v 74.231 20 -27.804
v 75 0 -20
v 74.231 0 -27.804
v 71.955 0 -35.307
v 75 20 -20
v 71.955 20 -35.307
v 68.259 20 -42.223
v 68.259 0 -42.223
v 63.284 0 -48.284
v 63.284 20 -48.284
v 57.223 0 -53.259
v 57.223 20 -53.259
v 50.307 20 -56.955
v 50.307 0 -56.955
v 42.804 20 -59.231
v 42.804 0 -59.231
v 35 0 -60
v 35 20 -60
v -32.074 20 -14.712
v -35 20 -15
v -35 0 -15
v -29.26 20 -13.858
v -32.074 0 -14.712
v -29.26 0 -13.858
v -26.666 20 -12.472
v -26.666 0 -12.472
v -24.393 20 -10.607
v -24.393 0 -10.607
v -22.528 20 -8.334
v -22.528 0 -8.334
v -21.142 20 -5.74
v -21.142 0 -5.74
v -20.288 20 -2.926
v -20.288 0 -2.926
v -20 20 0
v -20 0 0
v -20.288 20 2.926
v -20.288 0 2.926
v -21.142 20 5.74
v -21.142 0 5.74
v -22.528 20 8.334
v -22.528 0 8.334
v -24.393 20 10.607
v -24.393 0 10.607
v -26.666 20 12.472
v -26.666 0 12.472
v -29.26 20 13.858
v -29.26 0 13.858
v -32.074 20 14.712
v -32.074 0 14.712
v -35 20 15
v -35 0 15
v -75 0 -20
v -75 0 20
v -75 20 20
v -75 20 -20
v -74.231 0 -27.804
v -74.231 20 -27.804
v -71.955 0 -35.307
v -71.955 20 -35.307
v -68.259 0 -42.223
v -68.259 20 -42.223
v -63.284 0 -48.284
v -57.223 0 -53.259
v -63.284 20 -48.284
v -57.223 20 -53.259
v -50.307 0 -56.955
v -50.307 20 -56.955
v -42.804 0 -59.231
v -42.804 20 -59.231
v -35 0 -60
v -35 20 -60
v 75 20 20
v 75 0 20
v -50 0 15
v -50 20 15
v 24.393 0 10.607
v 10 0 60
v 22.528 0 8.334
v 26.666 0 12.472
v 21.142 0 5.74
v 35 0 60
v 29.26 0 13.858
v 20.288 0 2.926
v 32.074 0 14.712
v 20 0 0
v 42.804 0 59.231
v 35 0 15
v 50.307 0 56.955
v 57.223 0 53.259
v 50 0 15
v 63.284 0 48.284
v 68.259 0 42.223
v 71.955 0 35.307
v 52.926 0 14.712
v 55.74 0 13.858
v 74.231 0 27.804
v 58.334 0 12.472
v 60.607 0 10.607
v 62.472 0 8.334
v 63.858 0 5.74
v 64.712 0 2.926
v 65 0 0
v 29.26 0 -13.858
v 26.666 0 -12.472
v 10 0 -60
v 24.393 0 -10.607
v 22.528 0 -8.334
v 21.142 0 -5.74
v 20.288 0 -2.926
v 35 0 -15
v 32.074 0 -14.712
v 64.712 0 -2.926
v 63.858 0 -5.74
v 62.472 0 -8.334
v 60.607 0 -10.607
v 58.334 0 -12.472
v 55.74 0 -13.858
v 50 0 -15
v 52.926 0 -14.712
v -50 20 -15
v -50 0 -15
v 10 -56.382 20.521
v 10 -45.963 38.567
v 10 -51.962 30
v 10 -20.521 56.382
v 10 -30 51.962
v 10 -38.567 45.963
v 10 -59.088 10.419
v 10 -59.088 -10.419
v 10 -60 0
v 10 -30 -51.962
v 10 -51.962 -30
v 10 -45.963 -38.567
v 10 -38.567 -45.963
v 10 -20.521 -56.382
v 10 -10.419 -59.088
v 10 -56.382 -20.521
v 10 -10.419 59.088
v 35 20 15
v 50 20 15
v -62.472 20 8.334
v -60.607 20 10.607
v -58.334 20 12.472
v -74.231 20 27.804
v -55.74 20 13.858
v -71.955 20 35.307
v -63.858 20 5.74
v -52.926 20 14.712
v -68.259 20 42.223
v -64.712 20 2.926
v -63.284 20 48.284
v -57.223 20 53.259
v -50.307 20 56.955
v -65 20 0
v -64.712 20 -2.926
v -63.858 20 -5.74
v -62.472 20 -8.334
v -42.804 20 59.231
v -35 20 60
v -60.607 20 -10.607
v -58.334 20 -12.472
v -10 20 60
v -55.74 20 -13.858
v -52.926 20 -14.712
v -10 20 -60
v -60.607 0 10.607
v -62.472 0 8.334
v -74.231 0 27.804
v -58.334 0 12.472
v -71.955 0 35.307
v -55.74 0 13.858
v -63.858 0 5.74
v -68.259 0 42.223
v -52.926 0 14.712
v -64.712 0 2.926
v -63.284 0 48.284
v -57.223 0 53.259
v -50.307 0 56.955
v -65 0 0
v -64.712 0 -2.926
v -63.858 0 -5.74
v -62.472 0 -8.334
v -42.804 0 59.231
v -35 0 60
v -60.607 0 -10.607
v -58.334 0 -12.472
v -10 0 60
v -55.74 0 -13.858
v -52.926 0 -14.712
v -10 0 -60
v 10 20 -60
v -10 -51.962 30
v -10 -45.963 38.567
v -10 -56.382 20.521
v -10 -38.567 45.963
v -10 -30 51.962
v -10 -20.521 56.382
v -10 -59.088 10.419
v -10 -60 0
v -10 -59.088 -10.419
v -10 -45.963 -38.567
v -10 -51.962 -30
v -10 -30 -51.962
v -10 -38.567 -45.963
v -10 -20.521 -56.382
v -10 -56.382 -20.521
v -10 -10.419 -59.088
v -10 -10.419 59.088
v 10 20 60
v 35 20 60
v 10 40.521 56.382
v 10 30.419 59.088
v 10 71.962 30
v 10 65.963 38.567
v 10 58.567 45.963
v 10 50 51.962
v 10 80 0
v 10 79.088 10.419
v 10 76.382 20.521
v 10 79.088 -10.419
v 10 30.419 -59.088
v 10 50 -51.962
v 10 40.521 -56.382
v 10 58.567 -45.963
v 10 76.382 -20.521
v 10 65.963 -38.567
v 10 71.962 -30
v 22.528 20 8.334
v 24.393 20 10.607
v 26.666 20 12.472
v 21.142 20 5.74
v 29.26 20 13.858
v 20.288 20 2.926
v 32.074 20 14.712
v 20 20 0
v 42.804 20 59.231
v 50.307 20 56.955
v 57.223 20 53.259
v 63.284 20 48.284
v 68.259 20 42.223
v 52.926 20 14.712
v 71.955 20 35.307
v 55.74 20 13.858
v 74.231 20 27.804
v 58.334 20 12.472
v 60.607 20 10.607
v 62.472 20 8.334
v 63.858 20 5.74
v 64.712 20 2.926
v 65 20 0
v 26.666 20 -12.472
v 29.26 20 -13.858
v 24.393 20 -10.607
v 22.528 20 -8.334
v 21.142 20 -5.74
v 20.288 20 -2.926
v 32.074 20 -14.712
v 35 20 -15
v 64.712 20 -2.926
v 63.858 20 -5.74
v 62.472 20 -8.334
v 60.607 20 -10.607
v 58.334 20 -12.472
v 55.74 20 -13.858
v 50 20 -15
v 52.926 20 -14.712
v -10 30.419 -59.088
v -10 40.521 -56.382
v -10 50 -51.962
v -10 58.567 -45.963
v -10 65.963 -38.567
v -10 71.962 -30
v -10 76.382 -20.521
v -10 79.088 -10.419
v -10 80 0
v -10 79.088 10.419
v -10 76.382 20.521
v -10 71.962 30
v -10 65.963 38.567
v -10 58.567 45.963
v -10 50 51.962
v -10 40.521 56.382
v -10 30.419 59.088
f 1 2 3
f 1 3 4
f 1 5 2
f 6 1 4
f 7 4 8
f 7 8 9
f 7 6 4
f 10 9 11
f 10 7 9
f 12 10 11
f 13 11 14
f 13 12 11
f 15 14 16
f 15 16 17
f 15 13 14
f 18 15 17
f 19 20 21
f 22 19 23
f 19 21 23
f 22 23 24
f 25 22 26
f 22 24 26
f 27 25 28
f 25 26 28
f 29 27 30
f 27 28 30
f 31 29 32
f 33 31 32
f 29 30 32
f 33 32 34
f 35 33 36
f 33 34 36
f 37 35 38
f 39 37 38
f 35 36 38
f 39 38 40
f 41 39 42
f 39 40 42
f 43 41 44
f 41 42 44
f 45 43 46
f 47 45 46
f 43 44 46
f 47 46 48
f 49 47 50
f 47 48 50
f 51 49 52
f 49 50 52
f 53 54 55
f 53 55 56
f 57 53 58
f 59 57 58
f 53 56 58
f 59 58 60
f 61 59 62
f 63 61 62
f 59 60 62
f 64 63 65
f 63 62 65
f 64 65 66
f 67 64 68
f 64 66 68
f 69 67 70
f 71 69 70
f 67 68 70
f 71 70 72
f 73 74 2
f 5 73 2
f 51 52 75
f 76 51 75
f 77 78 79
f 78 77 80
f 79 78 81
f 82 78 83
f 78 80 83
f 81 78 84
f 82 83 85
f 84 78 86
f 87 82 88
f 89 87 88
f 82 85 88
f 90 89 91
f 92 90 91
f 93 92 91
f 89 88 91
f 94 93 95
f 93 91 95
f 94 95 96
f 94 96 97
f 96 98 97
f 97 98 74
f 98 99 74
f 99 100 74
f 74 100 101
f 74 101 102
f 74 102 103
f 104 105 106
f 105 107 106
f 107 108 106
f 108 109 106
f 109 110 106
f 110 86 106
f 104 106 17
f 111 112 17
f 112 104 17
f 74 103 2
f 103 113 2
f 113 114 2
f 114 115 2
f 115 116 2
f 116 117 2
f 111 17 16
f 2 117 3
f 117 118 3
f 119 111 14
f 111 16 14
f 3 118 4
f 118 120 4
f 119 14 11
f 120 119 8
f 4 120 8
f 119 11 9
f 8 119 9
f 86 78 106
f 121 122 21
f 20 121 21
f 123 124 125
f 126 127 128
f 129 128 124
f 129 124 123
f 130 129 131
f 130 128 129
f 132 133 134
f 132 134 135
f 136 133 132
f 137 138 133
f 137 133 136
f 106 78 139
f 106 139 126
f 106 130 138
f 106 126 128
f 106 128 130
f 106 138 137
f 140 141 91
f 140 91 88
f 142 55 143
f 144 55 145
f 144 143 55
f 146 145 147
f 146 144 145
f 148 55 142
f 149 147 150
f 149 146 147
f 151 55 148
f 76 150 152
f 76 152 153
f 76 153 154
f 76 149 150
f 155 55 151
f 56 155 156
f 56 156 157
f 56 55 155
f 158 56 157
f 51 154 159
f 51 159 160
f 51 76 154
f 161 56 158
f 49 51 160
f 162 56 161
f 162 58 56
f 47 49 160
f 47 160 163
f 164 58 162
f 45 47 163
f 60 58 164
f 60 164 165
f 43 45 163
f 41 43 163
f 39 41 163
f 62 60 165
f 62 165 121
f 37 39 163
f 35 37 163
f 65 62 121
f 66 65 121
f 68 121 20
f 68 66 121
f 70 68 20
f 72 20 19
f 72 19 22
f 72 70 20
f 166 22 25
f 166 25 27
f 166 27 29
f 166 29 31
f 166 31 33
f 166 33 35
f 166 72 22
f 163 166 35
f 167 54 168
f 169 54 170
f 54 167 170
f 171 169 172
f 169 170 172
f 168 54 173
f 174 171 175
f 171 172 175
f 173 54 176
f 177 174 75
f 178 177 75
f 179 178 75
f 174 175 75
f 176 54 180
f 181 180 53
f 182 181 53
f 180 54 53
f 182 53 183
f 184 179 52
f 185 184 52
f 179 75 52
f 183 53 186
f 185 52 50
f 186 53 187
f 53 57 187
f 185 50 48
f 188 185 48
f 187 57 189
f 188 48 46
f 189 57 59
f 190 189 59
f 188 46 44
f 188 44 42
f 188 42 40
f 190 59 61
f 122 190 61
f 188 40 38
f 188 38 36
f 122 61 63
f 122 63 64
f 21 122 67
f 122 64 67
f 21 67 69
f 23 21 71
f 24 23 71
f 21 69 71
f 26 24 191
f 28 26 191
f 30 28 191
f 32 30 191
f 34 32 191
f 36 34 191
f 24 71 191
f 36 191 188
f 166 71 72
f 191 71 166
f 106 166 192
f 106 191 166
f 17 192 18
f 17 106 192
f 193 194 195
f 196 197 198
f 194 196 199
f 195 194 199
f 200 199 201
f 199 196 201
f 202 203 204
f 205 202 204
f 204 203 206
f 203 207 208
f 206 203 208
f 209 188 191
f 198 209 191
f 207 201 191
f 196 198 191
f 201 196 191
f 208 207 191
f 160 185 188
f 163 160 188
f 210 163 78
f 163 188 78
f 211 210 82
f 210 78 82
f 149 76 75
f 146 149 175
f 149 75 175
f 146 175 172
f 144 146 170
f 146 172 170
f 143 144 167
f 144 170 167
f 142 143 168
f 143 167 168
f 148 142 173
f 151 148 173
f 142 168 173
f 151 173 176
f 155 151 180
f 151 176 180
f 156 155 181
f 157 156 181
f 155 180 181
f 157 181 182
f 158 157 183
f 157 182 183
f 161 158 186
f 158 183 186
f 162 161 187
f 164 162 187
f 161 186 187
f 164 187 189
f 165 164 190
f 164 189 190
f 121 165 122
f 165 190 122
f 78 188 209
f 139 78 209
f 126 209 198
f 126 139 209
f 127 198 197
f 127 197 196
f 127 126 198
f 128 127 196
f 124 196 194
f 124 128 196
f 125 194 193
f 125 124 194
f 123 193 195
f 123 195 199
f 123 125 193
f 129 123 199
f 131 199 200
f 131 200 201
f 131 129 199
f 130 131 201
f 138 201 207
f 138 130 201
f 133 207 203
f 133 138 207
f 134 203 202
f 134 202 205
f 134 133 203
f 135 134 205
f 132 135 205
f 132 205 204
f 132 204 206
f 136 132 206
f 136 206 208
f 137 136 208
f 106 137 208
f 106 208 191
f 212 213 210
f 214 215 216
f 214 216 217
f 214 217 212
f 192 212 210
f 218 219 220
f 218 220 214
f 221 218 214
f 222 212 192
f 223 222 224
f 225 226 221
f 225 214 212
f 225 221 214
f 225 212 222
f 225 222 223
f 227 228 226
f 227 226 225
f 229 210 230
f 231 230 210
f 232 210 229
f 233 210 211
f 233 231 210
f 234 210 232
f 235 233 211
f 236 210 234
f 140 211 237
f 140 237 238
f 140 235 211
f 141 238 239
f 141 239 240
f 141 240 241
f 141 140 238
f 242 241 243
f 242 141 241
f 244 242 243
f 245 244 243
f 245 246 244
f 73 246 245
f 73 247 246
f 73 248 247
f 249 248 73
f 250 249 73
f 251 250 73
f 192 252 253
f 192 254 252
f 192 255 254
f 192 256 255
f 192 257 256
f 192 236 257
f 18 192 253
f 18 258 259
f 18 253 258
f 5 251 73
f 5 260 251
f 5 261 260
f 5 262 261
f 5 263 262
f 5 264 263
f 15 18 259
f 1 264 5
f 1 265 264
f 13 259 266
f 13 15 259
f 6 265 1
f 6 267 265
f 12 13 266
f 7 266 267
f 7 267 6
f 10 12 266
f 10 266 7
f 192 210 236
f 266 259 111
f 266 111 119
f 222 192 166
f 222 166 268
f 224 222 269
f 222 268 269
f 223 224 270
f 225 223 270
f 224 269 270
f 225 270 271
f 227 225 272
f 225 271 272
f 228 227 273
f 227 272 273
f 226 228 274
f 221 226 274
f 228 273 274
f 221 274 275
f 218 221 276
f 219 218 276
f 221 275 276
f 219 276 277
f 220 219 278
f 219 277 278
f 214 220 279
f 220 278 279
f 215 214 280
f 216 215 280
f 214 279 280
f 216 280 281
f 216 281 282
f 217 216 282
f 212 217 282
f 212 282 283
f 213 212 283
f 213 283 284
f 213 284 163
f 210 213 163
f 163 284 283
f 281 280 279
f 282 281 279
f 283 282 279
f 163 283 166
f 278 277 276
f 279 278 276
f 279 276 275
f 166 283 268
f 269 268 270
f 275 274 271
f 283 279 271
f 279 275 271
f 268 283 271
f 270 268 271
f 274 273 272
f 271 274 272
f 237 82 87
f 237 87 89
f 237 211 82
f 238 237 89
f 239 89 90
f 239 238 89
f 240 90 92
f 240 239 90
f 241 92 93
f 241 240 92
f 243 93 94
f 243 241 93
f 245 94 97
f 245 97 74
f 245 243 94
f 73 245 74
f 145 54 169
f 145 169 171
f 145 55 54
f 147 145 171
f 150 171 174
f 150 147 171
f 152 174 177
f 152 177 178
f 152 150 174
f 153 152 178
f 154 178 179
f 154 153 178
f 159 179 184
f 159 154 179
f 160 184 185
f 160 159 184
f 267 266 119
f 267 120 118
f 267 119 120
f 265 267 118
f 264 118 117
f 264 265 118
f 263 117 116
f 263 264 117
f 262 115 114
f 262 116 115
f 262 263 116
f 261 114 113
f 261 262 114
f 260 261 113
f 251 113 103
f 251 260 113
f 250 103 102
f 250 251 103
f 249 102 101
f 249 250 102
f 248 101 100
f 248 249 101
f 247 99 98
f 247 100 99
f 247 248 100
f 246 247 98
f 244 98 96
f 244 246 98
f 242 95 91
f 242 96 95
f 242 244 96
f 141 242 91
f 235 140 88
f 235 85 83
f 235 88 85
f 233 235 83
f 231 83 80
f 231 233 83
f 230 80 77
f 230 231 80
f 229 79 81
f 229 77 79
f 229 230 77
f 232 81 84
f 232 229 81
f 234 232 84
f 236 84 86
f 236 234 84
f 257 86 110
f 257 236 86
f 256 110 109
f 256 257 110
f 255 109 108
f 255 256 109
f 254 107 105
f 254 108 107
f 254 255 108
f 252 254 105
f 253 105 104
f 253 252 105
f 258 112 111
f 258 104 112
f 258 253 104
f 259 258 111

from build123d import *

# Parameters (mm, degrees)
CROQUIS1_W              = 150
CROQUIS1_H              = 120
SALIENTE_EXTRUIR1_DEPTH = 20
REDONDEO1_R             = 40
SALIENTE_EXTRUIR3_DEPTH = 10
CORTAR_EXTRUIR1_DEPTH   = 33.5


with BuildPart() as part:
    # Croquis1 → Saliente-Extruir1 (new body)
    with BuildSketch(Plane(origin=(0, 0, 0), x_dir=(1, 0, 0), z_dir=(0, 1, 0))):
        Rectangle(CROQUIS1_W, CROQUIS1_H)
    extrude(amount=SALIENTE_EXTRUIR1_DEPTH)

    # Redondeo1
    redondeo1_edges = [part.edges().sort_by_distance(p)[0] for p in [
        (-75, 10, -60),
        (75, 10, -60),
        (75, 10, 60),
        (-75, 10, 60),
    ]]
    fillet(redondeo1_edges, radius=REDONDEO1_R)

    # Croquis3 → Saliente-Extruir3 (add, symmetric)
    with BuildSketch(Plane(origin=(0, 0, 0), x_dir=(0, 0, -1), z_dir=(1, 0, 0))):
        with BuildLine():
            Line((-60, 20), (60, 20))
            ThreePointArc((60, 20), (0, 80), (-60, 20))
        make_face()
        with BuildLine():
            Line((60, 0), (-60, 0))
            ThreePointArc((-60, 0), (0, -60), (60, 0))
        make_face()
    extrude(amount=SALIENTE_EXTRUIR3_DEPTH, both=True)

    # Croquis4 → Cortar-Extruir1 (cut, symmetric)
    with BuildSketch(Plane(origin=(0, 20, 0), x_dir=(1, 0, 0), z_dir=(0, 1, 0))):
        with BuildLine():
            Line((-50, 15), (-35, 15))
            ThreePointArc((-35, 15), (-20, 0), (-35, -15))
            Line((-35, -15), (-50, -15))
            ThreePointArc((-50, -15), (-65, 0), (-50, 15))
        make_face()
        with BuildLine():
            Line((50, -15), (35, -15))
            ThreePointArc((35, -15), (20, 0), (35, 15))
            Line((35, 15), (50, 15))
            ThreePointArc((50, 15), (65, 0), (50, -15))
        make_face()
    extrude(amount=CORTAR_EXTRUIR1_DEPTH, both=True, mode=Mode.SUBTRACT)


solid = part.part
